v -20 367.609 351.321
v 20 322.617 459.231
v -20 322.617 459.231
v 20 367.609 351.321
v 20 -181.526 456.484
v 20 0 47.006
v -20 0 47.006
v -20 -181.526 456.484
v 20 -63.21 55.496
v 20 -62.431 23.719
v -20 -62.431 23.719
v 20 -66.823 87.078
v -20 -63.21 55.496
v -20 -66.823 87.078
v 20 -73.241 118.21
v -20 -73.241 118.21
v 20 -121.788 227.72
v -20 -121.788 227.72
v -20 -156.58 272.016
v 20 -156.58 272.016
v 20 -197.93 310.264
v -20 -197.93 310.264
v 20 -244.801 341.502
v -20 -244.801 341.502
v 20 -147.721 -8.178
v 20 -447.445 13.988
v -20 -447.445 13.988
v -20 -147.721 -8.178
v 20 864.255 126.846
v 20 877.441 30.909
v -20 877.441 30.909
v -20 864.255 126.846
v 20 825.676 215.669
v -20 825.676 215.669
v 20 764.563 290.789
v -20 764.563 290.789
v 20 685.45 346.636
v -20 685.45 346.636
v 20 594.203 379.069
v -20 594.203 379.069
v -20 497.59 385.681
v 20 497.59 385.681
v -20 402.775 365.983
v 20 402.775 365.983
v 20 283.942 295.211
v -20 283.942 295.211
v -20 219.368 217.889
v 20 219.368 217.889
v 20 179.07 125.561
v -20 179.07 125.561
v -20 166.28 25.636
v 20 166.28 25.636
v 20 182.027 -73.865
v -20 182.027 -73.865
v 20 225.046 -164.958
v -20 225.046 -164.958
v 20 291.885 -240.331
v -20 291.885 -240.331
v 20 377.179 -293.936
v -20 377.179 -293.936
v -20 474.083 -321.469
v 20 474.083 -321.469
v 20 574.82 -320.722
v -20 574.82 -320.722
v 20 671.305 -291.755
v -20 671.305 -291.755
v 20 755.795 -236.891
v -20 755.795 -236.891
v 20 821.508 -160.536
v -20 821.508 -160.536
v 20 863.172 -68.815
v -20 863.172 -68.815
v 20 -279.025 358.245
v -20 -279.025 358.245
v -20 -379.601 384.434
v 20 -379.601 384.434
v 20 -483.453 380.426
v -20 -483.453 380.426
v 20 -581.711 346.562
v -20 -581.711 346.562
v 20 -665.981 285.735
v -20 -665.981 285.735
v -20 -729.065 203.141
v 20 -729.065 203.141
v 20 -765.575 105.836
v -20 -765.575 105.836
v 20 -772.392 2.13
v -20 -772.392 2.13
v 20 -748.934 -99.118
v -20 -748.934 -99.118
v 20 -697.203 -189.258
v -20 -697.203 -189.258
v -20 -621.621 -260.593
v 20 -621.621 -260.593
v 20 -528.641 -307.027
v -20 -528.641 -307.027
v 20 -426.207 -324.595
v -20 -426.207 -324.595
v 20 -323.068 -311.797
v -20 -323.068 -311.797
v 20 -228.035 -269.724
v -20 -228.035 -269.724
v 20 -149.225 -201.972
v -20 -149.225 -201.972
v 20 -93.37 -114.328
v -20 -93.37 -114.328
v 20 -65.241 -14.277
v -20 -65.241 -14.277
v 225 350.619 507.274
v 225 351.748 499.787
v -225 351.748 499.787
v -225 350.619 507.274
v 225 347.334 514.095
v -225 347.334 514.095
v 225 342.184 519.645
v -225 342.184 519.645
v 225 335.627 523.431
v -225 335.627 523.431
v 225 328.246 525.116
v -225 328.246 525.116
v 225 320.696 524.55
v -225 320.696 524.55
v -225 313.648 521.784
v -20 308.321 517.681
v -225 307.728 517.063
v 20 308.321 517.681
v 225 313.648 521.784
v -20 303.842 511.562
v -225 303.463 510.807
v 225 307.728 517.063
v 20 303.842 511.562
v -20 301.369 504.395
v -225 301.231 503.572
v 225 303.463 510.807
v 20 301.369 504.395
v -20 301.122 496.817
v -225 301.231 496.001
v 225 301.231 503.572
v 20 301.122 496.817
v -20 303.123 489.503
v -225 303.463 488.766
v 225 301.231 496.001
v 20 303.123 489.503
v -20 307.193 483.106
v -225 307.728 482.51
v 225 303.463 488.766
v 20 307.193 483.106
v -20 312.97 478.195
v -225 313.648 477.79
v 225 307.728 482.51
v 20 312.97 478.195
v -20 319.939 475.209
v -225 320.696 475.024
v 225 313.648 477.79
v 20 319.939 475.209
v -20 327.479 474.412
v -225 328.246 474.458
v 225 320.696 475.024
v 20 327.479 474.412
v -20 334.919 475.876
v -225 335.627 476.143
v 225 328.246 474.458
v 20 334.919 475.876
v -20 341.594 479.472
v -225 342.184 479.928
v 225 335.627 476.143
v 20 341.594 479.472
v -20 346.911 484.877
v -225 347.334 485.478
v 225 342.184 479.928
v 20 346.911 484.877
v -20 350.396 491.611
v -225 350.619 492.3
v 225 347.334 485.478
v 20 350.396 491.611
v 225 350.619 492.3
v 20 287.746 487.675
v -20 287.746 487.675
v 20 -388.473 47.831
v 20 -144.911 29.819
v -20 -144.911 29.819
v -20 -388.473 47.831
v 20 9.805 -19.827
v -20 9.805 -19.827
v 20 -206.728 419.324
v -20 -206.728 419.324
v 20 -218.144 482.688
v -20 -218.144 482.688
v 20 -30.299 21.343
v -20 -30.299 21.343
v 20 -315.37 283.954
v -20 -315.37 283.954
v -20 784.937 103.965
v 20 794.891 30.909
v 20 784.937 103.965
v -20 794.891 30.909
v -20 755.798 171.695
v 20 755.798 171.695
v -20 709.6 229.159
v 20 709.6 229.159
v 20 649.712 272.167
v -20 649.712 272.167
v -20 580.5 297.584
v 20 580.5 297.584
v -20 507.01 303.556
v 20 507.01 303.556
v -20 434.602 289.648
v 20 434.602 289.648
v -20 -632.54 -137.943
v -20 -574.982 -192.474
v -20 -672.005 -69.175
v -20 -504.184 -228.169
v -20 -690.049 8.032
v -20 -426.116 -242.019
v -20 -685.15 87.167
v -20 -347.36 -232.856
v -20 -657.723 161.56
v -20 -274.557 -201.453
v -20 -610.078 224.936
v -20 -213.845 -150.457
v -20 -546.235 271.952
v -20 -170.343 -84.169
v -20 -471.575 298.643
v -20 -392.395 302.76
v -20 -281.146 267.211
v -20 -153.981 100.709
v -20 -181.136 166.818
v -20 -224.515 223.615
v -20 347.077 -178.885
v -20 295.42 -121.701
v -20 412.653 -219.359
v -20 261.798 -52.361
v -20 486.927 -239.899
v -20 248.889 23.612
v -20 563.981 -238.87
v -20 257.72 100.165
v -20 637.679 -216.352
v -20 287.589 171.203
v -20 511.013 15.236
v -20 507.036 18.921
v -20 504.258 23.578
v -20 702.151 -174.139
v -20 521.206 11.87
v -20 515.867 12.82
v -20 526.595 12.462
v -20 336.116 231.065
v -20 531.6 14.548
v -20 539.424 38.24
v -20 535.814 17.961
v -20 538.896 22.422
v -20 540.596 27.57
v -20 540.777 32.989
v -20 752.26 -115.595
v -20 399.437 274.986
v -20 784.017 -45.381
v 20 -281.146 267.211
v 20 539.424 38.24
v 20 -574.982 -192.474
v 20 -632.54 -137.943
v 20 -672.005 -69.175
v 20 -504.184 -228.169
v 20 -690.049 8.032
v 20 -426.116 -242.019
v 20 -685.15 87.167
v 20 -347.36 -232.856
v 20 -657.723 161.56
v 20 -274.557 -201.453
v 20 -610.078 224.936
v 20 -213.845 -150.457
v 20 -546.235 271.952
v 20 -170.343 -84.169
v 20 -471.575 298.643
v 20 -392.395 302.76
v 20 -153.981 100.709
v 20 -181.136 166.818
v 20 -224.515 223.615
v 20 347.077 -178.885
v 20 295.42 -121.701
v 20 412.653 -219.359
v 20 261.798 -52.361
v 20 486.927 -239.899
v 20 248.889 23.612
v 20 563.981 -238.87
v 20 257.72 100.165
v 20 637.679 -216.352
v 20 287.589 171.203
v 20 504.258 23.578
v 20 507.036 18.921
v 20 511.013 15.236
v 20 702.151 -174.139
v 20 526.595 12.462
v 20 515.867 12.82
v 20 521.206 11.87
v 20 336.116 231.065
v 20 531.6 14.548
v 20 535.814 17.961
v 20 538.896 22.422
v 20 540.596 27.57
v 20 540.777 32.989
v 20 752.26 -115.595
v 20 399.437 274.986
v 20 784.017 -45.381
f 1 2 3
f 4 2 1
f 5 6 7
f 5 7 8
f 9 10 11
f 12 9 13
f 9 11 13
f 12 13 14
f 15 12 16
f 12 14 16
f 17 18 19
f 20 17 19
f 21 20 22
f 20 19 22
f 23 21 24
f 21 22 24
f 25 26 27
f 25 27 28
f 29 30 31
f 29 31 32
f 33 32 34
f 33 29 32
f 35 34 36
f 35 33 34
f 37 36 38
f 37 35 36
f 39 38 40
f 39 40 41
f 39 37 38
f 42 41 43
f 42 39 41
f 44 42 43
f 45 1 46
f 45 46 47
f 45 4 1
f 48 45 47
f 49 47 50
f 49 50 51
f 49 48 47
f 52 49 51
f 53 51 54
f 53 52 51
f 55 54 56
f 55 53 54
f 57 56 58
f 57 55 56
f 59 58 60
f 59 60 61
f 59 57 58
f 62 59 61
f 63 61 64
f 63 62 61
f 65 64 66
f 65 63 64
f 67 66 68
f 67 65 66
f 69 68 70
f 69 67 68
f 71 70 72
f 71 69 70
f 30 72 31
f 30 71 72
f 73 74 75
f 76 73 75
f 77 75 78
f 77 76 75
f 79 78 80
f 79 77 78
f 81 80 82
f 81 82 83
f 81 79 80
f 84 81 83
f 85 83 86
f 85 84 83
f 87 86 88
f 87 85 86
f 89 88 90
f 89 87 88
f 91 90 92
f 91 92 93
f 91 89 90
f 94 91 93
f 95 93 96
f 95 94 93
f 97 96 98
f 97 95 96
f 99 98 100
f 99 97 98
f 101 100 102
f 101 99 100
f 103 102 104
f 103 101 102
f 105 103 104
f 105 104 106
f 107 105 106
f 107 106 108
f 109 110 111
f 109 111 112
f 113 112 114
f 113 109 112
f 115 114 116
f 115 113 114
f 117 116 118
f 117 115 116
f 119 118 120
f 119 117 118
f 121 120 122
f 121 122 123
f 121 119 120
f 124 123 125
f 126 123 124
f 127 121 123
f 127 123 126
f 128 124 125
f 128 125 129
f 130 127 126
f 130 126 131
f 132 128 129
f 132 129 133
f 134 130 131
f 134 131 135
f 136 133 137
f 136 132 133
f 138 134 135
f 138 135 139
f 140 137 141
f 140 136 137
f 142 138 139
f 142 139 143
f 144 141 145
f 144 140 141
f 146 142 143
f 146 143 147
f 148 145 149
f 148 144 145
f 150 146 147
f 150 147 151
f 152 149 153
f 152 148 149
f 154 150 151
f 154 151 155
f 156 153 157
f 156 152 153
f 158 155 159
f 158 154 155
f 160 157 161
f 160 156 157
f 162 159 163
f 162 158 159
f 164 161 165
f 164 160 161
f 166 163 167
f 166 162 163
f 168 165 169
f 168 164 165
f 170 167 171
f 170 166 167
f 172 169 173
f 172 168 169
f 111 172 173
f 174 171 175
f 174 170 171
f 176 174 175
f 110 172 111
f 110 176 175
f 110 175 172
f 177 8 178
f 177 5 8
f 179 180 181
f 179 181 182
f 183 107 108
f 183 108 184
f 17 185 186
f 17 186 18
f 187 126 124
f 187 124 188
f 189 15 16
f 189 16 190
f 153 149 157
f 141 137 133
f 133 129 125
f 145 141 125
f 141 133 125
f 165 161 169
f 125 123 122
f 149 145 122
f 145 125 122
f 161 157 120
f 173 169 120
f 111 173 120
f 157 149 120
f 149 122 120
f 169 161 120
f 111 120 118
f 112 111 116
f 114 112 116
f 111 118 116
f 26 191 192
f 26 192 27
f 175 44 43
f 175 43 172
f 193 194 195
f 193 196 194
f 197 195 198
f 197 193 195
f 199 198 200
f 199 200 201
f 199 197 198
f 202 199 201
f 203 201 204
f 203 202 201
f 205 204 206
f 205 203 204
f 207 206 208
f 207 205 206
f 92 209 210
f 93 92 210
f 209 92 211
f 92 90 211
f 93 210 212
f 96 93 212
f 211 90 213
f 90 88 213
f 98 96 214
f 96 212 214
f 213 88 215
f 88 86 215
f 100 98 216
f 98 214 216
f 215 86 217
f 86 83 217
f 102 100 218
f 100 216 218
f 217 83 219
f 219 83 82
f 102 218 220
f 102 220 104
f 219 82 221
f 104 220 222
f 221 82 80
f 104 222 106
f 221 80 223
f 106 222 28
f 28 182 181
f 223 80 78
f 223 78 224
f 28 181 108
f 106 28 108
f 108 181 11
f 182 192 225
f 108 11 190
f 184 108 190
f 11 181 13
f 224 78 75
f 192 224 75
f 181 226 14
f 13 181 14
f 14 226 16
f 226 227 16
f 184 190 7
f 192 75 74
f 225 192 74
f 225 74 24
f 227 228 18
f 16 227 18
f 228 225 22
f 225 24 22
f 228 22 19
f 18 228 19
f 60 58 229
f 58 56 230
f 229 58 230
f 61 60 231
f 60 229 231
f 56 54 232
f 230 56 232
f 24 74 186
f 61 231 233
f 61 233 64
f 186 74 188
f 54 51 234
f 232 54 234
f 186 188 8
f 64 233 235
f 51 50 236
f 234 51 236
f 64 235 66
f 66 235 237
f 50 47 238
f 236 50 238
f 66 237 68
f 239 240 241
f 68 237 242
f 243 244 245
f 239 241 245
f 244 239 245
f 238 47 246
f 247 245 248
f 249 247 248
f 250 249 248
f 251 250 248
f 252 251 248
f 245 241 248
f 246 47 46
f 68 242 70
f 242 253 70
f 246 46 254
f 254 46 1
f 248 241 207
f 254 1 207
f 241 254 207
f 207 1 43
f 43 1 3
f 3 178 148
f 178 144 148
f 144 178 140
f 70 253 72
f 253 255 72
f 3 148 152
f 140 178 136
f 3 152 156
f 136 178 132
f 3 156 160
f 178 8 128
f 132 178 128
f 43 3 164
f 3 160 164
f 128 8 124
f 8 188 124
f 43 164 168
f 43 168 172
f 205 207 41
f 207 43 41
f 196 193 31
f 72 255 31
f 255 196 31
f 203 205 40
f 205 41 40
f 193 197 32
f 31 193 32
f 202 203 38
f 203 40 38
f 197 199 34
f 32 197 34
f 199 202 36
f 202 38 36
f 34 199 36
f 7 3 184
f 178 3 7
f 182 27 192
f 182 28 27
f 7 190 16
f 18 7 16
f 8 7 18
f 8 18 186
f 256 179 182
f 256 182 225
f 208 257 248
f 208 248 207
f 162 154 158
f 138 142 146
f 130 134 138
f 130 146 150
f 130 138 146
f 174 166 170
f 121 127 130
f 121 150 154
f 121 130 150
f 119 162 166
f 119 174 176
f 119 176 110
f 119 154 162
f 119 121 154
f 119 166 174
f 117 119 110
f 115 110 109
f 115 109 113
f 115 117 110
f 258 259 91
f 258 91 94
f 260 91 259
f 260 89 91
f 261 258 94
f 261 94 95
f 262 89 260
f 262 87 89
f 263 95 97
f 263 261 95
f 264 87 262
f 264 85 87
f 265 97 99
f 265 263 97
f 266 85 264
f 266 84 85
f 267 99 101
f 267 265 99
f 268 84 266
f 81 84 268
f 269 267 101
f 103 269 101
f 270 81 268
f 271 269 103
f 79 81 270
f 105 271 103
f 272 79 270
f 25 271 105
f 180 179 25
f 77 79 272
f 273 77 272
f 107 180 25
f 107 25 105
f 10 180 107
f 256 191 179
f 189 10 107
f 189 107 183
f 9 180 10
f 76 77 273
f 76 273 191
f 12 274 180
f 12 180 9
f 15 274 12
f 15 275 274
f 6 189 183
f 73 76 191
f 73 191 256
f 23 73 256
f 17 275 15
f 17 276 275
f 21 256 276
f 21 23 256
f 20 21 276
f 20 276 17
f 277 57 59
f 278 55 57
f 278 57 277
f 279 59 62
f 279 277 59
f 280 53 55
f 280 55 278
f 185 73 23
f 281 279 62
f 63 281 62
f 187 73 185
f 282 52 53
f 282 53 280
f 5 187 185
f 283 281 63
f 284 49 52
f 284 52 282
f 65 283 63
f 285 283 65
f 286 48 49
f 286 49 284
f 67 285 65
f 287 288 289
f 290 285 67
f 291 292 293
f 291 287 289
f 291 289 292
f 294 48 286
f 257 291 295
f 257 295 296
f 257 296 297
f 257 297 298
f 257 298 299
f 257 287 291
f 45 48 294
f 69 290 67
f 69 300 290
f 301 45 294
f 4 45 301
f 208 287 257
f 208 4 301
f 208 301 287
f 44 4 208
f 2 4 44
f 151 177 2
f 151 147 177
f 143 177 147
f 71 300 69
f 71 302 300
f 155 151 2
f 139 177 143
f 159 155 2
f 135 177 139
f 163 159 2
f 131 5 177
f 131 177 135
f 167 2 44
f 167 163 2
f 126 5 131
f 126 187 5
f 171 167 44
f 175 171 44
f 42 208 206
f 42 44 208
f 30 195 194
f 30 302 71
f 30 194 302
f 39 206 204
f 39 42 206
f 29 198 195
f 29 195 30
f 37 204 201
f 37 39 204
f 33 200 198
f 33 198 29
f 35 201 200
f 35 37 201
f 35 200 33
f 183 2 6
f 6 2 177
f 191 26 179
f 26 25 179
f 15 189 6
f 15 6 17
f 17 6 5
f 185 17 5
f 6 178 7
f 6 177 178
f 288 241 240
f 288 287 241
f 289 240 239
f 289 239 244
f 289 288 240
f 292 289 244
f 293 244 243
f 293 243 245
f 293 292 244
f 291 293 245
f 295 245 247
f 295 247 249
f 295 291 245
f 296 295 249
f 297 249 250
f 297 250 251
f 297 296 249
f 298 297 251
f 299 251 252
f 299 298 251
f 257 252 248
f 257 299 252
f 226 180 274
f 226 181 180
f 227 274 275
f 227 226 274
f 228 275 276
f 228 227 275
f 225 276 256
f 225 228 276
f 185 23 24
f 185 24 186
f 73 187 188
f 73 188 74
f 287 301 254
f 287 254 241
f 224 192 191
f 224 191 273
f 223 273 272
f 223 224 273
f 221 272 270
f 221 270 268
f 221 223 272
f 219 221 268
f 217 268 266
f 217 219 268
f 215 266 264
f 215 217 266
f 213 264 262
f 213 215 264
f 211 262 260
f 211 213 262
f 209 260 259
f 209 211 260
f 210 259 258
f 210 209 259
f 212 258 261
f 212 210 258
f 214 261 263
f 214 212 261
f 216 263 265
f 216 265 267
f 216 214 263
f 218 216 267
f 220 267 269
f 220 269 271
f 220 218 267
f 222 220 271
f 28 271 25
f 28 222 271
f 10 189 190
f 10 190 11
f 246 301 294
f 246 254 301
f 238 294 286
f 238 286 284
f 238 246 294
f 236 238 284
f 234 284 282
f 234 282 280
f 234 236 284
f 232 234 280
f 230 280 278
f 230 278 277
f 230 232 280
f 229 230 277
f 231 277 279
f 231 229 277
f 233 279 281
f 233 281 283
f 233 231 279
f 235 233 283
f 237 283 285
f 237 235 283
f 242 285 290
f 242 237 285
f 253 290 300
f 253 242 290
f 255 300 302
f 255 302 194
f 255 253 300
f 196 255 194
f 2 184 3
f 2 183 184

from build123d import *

# Parameters (mm, degrees)
F3_DEPTH = 20
F1_R     = 355.6
F1_R_2   = 273.05
F4_DEPTH = 20
F5_R     = 25.4
F6_DEPTH = 225


with BuildPart() as f3:
    # F2 (on Right) → F3 (new body, symmetric)
    with BuildSketch(Plane.YZ):
        with BuildLine():
            Line((539.424256, 38.240109), (338.68509, 519.698787))
            Line((338.68509, 519.698787), (-218.144057, 482.688492))
            Line((-218.144057, 482.688492), (-447.444623, 13.987639))
            Line((-447.444623, 13.987639), (9.804998, -19.827125))
            Line((9.804998, -19.827125), (322.617488, 459.231032))
            Line((322.617488, 459.231032), (504.258433, 23.578087))
            ThreePointArc((504.258433, 23.578087), (529.172356, 13.326186), (539.424256, 38.240109))
        make_face()
        Polygon((-388.472688, 47.830557), (-206.728306, 419.324393), (-30.299405, 21.342738), align=None, mode=Mode.SUBTRACT)
        Polygon((0, 47.005516), (-181.525694, 456.484325), (287.745681, 487.674991), align=None, mode=Mode.SUBTRACT)
    extrude(amount=F3_DEPTH, both=True)

    # F1 (on Right) → F4 (join, symmetric)
    with BuildSketch(Plane.YZ):
        with Locations((-417.958655, 30.909098)):
            Circle(F1_R)
        with Locations((-417.958655, 30.909098)):
            Circle(F1_R_2, mode=Mode.SUBTRACT)
        with Locations((521.841345, 30.909098)):
            Circle(F1_R)
        with Locations((521.841345, 30.909098)):
            Circle(F1_R_2, mode=Mode.SUBTRACT)
    extrude(amount=F4_DEPTH, both=True)

    # F5 (on Right) → F6 (join, symmetric)
    with BuildSketch(Plane.YZ):
        with Locations((326.347711, 499.786736)):
            Circle(F5_R)
    extrude(amount=F6_DEPTH, both=True)


solid = f3.part
